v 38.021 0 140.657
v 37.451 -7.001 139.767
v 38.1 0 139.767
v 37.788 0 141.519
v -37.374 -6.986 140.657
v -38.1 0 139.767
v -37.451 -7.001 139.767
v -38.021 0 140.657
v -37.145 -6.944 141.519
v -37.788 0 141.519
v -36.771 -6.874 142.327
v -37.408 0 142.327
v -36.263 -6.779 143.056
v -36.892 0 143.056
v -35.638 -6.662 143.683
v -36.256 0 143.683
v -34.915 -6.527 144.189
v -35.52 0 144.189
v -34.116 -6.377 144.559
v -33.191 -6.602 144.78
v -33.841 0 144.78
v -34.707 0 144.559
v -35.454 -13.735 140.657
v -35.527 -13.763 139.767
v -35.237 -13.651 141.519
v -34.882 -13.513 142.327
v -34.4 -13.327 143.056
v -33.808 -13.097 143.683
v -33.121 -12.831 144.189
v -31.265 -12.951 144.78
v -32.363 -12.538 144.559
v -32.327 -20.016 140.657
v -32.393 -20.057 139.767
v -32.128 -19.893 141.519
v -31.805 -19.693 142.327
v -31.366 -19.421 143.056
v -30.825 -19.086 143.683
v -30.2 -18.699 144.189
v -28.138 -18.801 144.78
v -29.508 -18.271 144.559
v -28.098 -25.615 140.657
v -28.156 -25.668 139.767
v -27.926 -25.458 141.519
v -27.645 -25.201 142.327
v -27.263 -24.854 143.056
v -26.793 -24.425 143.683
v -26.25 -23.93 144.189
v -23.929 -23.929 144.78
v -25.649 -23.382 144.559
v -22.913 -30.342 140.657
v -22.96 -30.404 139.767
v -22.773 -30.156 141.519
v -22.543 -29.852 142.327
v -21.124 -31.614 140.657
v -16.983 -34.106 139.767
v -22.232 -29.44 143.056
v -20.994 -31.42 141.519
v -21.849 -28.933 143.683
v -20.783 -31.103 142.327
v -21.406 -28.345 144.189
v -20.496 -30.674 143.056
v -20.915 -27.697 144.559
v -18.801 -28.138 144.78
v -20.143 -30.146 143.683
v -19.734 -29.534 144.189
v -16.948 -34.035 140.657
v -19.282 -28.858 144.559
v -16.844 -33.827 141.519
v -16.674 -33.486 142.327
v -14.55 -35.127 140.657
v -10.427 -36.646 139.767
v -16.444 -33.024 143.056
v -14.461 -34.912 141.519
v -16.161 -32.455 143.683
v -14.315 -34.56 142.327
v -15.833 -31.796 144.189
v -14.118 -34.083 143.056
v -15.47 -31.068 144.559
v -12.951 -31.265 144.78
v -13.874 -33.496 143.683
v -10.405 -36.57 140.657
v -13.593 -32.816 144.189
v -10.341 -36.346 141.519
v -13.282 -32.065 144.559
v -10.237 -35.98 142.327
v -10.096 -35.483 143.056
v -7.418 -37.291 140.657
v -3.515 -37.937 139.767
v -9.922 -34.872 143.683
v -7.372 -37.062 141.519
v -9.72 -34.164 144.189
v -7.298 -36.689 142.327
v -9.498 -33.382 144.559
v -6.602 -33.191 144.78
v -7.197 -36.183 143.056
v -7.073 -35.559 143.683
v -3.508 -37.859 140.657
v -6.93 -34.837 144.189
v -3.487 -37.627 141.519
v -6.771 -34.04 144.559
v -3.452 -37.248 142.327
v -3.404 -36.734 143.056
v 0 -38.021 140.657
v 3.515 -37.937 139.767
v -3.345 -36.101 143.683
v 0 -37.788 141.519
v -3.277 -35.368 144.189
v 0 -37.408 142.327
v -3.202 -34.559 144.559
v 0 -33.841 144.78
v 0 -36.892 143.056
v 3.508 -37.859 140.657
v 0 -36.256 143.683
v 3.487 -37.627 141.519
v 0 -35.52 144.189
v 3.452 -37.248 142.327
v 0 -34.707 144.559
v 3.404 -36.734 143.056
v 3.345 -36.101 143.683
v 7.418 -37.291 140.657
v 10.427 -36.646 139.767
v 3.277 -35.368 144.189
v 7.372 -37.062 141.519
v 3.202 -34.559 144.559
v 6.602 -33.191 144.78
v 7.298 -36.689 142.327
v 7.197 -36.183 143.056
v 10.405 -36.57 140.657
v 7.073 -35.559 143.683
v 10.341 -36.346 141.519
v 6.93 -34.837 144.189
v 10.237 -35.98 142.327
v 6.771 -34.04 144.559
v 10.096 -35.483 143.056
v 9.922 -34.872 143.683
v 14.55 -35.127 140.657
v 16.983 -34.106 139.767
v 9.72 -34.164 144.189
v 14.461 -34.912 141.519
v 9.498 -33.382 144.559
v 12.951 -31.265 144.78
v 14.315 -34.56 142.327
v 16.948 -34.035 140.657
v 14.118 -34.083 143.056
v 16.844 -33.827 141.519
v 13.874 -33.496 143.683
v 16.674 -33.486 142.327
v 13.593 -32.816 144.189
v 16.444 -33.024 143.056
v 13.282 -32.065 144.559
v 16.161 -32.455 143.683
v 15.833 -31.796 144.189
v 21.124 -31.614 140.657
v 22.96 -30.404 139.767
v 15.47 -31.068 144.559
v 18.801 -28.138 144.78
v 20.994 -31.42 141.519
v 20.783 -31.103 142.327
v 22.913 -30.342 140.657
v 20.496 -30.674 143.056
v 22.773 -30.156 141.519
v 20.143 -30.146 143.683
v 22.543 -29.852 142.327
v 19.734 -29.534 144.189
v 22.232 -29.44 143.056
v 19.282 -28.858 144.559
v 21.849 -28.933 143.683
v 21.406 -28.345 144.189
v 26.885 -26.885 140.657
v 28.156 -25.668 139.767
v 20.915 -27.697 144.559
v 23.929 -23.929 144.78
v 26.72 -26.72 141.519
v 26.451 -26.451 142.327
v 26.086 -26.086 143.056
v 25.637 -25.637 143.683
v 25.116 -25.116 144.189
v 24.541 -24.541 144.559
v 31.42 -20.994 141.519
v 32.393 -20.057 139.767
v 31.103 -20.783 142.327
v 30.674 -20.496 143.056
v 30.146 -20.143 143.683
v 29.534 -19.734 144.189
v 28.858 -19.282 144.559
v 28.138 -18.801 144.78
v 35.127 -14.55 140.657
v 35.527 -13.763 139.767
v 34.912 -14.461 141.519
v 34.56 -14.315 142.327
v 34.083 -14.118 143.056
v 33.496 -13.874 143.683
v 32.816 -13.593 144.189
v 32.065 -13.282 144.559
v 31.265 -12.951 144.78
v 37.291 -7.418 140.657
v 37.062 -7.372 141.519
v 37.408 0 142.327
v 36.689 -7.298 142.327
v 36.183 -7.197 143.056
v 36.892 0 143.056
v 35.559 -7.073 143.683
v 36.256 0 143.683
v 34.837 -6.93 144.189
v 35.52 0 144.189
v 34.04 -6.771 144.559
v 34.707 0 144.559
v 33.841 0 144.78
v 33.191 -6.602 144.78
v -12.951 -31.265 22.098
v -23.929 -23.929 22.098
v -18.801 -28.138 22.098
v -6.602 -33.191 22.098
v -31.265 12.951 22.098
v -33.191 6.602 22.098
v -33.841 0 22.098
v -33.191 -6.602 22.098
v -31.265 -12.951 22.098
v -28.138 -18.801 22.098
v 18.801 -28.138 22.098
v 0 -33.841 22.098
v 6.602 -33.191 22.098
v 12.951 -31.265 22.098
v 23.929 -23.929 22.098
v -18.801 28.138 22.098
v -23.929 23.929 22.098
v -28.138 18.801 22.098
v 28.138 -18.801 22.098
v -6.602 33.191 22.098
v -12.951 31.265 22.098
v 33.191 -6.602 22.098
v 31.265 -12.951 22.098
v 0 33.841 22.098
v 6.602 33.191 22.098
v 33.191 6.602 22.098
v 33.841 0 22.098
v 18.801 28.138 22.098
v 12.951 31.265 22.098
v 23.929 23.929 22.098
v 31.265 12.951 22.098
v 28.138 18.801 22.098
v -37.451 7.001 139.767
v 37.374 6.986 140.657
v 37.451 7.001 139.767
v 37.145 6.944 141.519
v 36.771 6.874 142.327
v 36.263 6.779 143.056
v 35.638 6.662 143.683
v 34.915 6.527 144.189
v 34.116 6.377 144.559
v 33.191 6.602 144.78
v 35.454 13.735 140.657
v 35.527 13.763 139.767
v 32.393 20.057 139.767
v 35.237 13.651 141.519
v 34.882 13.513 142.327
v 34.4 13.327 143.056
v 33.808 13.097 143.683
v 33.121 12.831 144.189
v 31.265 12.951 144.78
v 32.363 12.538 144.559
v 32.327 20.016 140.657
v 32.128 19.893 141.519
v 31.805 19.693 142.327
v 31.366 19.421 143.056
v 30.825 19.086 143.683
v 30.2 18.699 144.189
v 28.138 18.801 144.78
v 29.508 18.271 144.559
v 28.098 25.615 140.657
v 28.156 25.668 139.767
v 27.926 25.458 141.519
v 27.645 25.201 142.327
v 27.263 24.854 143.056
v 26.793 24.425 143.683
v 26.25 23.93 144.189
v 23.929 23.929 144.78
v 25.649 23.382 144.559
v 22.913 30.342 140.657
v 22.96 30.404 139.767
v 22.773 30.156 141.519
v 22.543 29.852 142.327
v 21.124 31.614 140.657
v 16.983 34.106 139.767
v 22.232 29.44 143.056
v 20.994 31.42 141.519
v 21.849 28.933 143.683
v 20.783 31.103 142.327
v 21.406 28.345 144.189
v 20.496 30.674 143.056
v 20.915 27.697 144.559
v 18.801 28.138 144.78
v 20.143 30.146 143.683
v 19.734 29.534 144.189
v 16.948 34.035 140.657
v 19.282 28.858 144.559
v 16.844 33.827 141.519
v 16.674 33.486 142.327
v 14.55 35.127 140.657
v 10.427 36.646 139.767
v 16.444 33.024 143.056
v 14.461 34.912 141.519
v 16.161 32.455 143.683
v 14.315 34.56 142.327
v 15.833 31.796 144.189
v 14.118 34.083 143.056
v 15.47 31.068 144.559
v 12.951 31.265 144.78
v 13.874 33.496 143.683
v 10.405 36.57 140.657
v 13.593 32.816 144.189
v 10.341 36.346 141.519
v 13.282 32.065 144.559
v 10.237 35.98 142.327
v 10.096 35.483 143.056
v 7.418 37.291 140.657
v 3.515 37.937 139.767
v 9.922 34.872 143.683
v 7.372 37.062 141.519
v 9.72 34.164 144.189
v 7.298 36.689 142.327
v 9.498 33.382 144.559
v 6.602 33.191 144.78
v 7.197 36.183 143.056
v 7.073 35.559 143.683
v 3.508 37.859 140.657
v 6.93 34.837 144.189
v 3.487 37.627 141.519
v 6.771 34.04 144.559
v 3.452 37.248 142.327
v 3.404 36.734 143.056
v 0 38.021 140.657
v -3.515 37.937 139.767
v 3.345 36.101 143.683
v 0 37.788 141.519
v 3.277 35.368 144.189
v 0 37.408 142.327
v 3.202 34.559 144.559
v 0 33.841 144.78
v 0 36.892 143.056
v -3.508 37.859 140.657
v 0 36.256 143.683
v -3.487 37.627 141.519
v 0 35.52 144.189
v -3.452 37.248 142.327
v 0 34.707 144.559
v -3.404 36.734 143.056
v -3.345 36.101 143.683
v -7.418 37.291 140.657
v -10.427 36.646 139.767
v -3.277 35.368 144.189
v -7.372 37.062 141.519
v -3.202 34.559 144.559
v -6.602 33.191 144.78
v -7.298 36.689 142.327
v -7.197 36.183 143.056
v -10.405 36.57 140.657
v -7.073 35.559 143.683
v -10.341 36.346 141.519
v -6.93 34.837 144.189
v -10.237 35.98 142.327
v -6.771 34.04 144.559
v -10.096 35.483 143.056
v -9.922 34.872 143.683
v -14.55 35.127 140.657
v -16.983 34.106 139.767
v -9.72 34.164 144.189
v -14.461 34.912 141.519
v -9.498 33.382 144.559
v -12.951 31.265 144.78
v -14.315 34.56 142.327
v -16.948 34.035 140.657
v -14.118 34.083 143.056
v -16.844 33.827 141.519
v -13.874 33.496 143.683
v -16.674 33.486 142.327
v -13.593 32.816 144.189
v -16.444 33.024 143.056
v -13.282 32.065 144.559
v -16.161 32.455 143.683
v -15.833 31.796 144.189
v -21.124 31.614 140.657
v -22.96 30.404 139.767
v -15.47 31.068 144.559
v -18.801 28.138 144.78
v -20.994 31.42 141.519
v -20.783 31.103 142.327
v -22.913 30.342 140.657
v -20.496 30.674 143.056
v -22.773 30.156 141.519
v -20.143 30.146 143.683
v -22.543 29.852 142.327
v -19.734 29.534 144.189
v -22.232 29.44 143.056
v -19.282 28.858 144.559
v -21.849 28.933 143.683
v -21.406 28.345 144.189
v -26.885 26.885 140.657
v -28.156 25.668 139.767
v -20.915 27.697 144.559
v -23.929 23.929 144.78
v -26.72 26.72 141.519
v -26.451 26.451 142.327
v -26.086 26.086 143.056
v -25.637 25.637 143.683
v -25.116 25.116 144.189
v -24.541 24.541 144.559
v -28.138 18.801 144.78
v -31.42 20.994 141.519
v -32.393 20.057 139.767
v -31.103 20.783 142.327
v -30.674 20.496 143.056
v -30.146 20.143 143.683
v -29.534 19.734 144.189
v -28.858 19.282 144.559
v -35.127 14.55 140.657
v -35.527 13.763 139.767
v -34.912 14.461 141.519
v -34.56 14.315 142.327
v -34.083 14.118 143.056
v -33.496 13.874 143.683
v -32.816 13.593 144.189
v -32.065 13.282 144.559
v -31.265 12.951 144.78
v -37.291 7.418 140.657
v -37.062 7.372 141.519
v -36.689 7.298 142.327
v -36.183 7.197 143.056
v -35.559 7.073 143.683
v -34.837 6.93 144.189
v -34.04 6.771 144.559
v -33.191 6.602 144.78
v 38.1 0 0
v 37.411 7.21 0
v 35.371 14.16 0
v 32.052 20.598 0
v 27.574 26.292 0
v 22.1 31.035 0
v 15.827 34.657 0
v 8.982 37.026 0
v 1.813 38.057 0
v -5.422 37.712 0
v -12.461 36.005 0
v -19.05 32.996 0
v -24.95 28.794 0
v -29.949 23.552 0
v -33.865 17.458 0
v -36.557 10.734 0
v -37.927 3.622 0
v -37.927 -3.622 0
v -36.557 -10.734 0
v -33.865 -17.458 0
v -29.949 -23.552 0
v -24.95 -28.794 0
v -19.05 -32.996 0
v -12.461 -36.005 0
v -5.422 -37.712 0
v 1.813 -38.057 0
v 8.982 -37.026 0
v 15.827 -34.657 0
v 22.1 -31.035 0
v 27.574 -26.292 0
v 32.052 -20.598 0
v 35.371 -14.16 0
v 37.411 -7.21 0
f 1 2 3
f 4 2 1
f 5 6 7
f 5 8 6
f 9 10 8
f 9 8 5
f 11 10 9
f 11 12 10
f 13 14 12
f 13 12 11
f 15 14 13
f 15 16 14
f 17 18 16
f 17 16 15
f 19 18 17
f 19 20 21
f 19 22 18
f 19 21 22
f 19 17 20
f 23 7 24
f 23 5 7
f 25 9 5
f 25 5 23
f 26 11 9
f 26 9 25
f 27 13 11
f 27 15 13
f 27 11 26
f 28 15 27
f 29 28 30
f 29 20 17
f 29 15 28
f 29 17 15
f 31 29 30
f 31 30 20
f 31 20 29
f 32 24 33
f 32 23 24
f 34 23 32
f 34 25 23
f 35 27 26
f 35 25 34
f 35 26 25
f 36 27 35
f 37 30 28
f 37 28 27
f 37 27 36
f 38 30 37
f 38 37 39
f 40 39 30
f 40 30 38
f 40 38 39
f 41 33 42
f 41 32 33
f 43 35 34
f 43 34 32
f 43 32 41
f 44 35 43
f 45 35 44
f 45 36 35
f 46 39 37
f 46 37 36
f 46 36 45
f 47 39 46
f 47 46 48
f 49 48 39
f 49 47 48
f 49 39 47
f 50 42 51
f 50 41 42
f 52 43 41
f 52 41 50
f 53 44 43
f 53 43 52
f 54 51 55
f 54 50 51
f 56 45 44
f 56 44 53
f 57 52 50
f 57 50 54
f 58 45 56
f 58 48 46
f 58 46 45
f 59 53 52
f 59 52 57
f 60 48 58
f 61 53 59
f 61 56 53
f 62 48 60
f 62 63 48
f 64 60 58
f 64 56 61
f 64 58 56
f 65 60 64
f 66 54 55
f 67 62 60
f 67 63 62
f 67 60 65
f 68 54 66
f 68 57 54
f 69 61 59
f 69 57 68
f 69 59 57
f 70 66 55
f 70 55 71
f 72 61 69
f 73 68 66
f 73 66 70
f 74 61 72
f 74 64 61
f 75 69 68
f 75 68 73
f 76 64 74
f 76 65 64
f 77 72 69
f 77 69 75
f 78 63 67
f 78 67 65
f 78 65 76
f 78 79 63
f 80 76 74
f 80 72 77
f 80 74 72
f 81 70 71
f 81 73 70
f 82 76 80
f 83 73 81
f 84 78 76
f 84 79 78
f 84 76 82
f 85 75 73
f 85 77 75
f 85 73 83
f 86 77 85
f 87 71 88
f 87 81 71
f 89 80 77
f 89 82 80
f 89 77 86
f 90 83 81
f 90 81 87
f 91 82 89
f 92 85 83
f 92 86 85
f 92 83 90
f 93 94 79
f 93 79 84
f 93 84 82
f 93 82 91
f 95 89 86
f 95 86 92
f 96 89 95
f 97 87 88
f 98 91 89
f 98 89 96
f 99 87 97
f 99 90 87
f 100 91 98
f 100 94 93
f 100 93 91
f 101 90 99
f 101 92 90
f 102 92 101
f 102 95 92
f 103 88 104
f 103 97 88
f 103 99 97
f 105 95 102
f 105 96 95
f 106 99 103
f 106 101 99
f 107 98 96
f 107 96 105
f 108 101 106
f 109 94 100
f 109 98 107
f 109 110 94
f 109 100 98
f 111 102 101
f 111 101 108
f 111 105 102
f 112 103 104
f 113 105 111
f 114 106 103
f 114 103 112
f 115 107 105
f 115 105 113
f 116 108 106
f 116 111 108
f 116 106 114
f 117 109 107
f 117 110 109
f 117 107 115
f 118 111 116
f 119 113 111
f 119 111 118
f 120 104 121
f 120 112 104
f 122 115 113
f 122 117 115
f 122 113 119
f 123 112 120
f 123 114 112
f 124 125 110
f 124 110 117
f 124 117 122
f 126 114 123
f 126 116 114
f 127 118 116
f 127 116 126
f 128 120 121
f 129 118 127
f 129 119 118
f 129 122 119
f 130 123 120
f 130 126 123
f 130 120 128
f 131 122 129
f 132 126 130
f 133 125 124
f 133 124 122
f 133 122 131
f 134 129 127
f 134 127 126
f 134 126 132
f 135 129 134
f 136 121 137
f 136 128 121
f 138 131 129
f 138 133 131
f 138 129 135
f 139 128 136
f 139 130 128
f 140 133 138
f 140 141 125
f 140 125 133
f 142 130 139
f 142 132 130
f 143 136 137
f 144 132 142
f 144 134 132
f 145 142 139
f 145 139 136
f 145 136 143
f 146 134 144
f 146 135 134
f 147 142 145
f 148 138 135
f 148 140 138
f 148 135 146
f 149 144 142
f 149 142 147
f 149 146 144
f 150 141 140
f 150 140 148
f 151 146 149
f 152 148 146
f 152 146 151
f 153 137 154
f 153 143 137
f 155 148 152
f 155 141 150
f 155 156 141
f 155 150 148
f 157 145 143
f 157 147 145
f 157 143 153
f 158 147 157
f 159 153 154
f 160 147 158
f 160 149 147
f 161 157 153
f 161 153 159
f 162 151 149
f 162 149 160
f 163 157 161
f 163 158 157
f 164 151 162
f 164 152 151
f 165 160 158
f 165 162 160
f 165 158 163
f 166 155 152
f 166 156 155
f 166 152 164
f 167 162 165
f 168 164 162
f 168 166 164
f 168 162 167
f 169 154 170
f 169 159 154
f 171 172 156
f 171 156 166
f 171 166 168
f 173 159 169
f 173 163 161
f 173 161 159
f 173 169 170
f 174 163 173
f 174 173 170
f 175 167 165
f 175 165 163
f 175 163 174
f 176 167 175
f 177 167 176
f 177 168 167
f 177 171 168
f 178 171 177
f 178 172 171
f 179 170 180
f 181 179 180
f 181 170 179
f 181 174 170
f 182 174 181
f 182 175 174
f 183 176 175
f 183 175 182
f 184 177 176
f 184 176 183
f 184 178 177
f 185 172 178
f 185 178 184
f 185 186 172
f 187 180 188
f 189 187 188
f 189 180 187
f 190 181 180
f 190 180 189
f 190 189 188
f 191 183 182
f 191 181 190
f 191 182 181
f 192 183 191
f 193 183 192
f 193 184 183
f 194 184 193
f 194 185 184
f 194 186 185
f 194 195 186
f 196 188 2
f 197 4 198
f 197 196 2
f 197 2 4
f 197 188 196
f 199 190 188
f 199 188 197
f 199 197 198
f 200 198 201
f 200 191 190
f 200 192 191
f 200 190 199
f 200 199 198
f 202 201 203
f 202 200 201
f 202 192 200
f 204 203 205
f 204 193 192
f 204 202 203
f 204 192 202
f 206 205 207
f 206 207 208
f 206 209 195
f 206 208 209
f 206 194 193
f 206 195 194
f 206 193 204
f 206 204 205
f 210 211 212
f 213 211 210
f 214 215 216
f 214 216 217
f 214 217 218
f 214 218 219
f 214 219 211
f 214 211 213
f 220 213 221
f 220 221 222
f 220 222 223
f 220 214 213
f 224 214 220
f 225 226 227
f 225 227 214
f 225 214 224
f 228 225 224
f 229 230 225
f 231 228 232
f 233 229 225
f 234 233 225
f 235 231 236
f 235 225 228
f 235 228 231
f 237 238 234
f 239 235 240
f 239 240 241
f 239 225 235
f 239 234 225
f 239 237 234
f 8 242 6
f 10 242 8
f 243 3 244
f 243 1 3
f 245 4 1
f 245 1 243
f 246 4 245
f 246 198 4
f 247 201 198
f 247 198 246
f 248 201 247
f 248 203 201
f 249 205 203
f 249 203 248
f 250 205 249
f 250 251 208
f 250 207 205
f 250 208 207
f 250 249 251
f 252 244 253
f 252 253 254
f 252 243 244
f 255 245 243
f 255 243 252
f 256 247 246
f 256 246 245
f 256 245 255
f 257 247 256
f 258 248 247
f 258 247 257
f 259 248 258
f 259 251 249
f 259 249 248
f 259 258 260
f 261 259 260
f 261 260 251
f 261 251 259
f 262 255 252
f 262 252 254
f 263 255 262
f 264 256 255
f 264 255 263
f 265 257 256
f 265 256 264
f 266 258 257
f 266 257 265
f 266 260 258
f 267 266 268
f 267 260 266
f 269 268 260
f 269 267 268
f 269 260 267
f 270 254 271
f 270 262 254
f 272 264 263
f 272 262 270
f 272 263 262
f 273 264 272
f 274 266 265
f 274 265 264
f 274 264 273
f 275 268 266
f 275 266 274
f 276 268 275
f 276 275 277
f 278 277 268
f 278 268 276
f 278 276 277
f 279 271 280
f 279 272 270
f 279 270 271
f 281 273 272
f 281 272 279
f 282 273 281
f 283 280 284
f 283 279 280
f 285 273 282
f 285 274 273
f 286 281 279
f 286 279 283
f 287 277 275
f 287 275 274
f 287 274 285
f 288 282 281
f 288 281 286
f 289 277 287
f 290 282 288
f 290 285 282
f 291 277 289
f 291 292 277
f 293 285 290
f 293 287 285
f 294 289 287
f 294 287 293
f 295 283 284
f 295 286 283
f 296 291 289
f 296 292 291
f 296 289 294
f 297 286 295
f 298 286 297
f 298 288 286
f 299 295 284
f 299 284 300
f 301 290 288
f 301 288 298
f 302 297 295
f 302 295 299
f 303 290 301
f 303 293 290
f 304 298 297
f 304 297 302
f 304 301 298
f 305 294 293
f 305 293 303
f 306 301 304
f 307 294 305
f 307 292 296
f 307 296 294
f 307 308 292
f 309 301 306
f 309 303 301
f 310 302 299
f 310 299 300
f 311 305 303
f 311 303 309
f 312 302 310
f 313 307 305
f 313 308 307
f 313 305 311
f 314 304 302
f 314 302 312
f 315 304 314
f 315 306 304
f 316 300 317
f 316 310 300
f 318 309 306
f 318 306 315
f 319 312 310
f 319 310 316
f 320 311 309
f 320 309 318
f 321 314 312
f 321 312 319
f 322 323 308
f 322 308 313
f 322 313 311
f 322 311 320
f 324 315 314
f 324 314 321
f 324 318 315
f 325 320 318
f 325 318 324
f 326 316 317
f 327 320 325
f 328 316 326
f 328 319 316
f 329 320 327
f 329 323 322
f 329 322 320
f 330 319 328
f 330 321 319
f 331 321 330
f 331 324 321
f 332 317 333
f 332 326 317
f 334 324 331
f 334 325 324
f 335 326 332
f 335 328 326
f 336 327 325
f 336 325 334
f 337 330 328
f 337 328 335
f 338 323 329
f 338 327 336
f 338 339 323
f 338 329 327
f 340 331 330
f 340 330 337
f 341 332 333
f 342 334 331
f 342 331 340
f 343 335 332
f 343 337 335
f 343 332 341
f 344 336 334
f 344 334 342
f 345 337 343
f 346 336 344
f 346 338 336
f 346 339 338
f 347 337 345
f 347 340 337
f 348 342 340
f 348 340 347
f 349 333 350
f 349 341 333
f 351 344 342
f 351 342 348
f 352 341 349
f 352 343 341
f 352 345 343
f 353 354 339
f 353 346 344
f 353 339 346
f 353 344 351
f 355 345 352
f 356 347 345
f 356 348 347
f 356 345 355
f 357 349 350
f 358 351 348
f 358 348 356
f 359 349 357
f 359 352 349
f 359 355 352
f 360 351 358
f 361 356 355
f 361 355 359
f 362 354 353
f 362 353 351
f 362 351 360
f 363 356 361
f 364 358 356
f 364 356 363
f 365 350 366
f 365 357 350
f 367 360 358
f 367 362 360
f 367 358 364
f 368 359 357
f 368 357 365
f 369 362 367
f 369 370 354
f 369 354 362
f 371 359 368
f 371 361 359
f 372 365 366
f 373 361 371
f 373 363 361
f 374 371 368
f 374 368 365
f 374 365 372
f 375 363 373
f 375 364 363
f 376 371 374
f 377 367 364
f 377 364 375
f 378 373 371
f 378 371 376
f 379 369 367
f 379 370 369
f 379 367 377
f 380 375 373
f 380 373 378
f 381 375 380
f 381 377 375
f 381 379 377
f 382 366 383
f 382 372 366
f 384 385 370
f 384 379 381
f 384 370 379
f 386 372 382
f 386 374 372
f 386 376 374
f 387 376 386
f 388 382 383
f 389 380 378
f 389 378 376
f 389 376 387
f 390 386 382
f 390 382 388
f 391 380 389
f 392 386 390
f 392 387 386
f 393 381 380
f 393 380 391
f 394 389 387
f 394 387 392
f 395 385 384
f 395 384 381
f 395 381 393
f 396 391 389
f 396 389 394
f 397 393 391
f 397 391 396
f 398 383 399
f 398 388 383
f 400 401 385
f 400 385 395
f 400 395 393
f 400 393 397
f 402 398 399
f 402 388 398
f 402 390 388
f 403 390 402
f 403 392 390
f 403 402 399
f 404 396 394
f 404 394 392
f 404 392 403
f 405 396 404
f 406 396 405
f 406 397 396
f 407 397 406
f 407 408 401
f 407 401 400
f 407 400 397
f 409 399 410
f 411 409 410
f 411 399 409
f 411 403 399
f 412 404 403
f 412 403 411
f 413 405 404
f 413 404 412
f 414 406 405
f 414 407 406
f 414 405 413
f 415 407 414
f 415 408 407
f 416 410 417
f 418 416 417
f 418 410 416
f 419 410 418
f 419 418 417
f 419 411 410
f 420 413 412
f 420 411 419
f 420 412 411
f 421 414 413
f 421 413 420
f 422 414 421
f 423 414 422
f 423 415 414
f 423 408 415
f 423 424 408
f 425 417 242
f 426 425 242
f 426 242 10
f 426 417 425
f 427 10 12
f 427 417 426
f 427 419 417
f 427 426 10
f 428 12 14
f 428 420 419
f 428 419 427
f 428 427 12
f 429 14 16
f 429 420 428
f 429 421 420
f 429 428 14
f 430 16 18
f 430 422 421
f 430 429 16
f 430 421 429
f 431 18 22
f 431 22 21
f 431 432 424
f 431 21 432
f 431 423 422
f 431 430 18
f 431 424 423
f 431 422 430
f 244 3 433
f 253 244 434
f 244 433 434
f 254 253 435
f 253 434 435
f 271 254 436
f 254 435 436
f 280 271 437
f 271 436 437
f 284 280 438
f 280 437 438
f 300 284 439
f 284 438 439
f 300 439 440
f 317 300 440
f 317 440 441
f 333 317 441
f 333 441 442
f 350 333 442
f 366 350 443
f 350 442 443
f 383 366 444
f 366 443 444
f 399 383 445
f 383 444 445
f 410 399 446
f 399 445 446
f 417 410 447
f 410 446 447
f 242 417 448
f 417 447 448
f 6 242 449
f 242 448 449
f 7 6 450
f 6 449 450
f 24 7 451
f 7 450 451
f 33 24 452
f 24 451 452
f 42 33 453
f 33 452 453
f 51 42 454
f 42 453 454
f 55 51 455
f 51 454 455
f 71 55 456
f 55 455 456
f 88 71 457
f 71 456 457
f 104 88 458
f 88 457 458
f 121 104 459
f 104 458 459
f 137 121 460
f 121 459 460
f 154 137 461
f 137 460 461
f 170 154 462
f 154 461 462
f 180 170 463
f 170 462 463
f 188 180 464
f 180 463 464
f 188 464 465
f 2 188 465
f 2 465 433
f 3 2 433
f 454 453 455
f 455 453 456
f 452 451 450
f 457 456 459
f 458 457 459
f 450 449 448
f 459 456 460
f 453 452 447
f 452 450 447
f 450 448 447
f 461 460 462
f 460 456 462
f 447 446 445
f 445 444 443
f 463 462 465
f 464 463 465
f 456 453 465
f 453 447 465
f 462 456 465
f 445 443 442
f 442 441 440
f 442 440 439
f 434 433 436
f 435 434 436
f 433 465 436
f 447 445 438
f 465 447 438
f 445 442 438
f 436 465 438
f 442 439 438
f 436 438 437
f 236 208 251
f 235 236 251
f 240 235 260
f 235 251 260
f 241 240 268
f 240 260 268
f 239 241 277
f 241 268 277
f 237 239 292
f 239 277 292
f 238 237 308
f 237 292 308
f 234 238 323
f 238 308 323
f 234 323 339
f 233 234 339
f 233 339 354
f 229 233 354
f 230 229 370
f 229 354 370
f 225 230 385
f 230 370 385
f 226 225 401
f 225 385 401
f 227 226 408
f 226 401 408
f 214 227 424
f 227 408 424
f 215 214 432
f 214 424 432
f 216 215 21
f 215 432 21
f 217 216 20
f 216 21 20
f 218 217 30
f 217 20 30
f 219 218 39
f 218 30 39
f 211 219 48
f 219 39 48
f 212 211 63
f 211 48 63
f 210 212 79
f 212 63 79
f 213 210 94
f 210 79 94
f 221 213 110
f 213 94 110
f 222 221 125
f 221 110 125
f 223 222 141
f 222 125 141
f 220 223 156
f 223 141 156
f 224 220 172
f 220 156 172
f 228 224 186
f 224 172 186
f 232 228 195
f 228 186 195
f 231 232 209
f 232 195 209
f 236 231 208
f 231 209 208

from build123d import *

# Parameters (mm, degrees)
F0_R        = 38.1
F1_DEPTH    = 20.32
F2_R        = 38.1
F3_DEPTH    = 124.46
F5_DEPTH    = 122.682
F6_T2_ANGLE = 179.9999997765
F6_T4_ANGLE = 180.0000002235


# Not quite as in the source:
# - a fillet or chamfer that OpenCascade refuses, or shapes differently, is made with other operations: its cross-section is extruded or revolved along the edge and cut away or added
# - a feature names something its author has since deleted; it is built from what else it names


with BuildPart() as f1:
    # F0 (on Top) → F1 (new body)
    with BuildSketch(Plane.XY):
        Circle(F0_R)
    extrude(amount=F1_DEPTH)

    # F2 (on face) → F3 (join)
    with BuildSketch(Plane.XY.offset(20.32)):
        Circle(F2_R)
    extrude(amount=F3_DEPTH)

    # F4 (on face) → F5 (cut, symmetric)
    with BuildSketch(Plane.XY.offset(144.78)):
        with BuildLine():
            ThreePointArc((-33.8414182484, 0), (0, -33.8414182484), (33.8414182484, 0))
            ThreePointArc((33.8414182484, 0), (0, 33.8414182484), (-33.8414182484, 0))
        make_face()
    extrude(amount=F5_DEPTH, both=True, mode=Mode.SUBTRACT)

    # F6: fillet of radius 5.08 on 1 edges, made by hand

    # F6_s1 → F6_t2 (revolve, cut)
    with BuildSketch(Plane.XZ):
        with BuildLine():
            ThreePointArc((38.1, 139.7668500859), (36.8916407828, 143.0557401189), (33.8414182484, 144.78))
            Line((33.8414182484, 144.78), (38.1, 144.78))
            Line((38.1, 144.78), (38.1, 139.7668500859))
        make_face()
    revolve(axis=Axis((0, 0, 144.78), (0, 0, 1)), revolution_arc=F6_T2_ANGLE, mode=Mode.SUBTRACT)

    # F6_s3 → F6_t4 (revolve, cut)
    with BuildSketch(Plane.XZ):
        with BuildLine():
            ThreePointArc((-38.1, 139.7668500859), (-36.8916407828, 143.0557401189), (-33.8414182484, 144.78))
            Line((-33.8414182484, 144.78), (-38.1, 144.78))
            Line((-38.1, 144.78), (-38.1, 139.7668500859))
        make_face()
    revolve(axis=Axis((0, 0, 144.78), (0, 0, 1)), revolution_arc=F6_T4_ANGLE, mode=Mode.SUBTRACT)


solid = f1.part
